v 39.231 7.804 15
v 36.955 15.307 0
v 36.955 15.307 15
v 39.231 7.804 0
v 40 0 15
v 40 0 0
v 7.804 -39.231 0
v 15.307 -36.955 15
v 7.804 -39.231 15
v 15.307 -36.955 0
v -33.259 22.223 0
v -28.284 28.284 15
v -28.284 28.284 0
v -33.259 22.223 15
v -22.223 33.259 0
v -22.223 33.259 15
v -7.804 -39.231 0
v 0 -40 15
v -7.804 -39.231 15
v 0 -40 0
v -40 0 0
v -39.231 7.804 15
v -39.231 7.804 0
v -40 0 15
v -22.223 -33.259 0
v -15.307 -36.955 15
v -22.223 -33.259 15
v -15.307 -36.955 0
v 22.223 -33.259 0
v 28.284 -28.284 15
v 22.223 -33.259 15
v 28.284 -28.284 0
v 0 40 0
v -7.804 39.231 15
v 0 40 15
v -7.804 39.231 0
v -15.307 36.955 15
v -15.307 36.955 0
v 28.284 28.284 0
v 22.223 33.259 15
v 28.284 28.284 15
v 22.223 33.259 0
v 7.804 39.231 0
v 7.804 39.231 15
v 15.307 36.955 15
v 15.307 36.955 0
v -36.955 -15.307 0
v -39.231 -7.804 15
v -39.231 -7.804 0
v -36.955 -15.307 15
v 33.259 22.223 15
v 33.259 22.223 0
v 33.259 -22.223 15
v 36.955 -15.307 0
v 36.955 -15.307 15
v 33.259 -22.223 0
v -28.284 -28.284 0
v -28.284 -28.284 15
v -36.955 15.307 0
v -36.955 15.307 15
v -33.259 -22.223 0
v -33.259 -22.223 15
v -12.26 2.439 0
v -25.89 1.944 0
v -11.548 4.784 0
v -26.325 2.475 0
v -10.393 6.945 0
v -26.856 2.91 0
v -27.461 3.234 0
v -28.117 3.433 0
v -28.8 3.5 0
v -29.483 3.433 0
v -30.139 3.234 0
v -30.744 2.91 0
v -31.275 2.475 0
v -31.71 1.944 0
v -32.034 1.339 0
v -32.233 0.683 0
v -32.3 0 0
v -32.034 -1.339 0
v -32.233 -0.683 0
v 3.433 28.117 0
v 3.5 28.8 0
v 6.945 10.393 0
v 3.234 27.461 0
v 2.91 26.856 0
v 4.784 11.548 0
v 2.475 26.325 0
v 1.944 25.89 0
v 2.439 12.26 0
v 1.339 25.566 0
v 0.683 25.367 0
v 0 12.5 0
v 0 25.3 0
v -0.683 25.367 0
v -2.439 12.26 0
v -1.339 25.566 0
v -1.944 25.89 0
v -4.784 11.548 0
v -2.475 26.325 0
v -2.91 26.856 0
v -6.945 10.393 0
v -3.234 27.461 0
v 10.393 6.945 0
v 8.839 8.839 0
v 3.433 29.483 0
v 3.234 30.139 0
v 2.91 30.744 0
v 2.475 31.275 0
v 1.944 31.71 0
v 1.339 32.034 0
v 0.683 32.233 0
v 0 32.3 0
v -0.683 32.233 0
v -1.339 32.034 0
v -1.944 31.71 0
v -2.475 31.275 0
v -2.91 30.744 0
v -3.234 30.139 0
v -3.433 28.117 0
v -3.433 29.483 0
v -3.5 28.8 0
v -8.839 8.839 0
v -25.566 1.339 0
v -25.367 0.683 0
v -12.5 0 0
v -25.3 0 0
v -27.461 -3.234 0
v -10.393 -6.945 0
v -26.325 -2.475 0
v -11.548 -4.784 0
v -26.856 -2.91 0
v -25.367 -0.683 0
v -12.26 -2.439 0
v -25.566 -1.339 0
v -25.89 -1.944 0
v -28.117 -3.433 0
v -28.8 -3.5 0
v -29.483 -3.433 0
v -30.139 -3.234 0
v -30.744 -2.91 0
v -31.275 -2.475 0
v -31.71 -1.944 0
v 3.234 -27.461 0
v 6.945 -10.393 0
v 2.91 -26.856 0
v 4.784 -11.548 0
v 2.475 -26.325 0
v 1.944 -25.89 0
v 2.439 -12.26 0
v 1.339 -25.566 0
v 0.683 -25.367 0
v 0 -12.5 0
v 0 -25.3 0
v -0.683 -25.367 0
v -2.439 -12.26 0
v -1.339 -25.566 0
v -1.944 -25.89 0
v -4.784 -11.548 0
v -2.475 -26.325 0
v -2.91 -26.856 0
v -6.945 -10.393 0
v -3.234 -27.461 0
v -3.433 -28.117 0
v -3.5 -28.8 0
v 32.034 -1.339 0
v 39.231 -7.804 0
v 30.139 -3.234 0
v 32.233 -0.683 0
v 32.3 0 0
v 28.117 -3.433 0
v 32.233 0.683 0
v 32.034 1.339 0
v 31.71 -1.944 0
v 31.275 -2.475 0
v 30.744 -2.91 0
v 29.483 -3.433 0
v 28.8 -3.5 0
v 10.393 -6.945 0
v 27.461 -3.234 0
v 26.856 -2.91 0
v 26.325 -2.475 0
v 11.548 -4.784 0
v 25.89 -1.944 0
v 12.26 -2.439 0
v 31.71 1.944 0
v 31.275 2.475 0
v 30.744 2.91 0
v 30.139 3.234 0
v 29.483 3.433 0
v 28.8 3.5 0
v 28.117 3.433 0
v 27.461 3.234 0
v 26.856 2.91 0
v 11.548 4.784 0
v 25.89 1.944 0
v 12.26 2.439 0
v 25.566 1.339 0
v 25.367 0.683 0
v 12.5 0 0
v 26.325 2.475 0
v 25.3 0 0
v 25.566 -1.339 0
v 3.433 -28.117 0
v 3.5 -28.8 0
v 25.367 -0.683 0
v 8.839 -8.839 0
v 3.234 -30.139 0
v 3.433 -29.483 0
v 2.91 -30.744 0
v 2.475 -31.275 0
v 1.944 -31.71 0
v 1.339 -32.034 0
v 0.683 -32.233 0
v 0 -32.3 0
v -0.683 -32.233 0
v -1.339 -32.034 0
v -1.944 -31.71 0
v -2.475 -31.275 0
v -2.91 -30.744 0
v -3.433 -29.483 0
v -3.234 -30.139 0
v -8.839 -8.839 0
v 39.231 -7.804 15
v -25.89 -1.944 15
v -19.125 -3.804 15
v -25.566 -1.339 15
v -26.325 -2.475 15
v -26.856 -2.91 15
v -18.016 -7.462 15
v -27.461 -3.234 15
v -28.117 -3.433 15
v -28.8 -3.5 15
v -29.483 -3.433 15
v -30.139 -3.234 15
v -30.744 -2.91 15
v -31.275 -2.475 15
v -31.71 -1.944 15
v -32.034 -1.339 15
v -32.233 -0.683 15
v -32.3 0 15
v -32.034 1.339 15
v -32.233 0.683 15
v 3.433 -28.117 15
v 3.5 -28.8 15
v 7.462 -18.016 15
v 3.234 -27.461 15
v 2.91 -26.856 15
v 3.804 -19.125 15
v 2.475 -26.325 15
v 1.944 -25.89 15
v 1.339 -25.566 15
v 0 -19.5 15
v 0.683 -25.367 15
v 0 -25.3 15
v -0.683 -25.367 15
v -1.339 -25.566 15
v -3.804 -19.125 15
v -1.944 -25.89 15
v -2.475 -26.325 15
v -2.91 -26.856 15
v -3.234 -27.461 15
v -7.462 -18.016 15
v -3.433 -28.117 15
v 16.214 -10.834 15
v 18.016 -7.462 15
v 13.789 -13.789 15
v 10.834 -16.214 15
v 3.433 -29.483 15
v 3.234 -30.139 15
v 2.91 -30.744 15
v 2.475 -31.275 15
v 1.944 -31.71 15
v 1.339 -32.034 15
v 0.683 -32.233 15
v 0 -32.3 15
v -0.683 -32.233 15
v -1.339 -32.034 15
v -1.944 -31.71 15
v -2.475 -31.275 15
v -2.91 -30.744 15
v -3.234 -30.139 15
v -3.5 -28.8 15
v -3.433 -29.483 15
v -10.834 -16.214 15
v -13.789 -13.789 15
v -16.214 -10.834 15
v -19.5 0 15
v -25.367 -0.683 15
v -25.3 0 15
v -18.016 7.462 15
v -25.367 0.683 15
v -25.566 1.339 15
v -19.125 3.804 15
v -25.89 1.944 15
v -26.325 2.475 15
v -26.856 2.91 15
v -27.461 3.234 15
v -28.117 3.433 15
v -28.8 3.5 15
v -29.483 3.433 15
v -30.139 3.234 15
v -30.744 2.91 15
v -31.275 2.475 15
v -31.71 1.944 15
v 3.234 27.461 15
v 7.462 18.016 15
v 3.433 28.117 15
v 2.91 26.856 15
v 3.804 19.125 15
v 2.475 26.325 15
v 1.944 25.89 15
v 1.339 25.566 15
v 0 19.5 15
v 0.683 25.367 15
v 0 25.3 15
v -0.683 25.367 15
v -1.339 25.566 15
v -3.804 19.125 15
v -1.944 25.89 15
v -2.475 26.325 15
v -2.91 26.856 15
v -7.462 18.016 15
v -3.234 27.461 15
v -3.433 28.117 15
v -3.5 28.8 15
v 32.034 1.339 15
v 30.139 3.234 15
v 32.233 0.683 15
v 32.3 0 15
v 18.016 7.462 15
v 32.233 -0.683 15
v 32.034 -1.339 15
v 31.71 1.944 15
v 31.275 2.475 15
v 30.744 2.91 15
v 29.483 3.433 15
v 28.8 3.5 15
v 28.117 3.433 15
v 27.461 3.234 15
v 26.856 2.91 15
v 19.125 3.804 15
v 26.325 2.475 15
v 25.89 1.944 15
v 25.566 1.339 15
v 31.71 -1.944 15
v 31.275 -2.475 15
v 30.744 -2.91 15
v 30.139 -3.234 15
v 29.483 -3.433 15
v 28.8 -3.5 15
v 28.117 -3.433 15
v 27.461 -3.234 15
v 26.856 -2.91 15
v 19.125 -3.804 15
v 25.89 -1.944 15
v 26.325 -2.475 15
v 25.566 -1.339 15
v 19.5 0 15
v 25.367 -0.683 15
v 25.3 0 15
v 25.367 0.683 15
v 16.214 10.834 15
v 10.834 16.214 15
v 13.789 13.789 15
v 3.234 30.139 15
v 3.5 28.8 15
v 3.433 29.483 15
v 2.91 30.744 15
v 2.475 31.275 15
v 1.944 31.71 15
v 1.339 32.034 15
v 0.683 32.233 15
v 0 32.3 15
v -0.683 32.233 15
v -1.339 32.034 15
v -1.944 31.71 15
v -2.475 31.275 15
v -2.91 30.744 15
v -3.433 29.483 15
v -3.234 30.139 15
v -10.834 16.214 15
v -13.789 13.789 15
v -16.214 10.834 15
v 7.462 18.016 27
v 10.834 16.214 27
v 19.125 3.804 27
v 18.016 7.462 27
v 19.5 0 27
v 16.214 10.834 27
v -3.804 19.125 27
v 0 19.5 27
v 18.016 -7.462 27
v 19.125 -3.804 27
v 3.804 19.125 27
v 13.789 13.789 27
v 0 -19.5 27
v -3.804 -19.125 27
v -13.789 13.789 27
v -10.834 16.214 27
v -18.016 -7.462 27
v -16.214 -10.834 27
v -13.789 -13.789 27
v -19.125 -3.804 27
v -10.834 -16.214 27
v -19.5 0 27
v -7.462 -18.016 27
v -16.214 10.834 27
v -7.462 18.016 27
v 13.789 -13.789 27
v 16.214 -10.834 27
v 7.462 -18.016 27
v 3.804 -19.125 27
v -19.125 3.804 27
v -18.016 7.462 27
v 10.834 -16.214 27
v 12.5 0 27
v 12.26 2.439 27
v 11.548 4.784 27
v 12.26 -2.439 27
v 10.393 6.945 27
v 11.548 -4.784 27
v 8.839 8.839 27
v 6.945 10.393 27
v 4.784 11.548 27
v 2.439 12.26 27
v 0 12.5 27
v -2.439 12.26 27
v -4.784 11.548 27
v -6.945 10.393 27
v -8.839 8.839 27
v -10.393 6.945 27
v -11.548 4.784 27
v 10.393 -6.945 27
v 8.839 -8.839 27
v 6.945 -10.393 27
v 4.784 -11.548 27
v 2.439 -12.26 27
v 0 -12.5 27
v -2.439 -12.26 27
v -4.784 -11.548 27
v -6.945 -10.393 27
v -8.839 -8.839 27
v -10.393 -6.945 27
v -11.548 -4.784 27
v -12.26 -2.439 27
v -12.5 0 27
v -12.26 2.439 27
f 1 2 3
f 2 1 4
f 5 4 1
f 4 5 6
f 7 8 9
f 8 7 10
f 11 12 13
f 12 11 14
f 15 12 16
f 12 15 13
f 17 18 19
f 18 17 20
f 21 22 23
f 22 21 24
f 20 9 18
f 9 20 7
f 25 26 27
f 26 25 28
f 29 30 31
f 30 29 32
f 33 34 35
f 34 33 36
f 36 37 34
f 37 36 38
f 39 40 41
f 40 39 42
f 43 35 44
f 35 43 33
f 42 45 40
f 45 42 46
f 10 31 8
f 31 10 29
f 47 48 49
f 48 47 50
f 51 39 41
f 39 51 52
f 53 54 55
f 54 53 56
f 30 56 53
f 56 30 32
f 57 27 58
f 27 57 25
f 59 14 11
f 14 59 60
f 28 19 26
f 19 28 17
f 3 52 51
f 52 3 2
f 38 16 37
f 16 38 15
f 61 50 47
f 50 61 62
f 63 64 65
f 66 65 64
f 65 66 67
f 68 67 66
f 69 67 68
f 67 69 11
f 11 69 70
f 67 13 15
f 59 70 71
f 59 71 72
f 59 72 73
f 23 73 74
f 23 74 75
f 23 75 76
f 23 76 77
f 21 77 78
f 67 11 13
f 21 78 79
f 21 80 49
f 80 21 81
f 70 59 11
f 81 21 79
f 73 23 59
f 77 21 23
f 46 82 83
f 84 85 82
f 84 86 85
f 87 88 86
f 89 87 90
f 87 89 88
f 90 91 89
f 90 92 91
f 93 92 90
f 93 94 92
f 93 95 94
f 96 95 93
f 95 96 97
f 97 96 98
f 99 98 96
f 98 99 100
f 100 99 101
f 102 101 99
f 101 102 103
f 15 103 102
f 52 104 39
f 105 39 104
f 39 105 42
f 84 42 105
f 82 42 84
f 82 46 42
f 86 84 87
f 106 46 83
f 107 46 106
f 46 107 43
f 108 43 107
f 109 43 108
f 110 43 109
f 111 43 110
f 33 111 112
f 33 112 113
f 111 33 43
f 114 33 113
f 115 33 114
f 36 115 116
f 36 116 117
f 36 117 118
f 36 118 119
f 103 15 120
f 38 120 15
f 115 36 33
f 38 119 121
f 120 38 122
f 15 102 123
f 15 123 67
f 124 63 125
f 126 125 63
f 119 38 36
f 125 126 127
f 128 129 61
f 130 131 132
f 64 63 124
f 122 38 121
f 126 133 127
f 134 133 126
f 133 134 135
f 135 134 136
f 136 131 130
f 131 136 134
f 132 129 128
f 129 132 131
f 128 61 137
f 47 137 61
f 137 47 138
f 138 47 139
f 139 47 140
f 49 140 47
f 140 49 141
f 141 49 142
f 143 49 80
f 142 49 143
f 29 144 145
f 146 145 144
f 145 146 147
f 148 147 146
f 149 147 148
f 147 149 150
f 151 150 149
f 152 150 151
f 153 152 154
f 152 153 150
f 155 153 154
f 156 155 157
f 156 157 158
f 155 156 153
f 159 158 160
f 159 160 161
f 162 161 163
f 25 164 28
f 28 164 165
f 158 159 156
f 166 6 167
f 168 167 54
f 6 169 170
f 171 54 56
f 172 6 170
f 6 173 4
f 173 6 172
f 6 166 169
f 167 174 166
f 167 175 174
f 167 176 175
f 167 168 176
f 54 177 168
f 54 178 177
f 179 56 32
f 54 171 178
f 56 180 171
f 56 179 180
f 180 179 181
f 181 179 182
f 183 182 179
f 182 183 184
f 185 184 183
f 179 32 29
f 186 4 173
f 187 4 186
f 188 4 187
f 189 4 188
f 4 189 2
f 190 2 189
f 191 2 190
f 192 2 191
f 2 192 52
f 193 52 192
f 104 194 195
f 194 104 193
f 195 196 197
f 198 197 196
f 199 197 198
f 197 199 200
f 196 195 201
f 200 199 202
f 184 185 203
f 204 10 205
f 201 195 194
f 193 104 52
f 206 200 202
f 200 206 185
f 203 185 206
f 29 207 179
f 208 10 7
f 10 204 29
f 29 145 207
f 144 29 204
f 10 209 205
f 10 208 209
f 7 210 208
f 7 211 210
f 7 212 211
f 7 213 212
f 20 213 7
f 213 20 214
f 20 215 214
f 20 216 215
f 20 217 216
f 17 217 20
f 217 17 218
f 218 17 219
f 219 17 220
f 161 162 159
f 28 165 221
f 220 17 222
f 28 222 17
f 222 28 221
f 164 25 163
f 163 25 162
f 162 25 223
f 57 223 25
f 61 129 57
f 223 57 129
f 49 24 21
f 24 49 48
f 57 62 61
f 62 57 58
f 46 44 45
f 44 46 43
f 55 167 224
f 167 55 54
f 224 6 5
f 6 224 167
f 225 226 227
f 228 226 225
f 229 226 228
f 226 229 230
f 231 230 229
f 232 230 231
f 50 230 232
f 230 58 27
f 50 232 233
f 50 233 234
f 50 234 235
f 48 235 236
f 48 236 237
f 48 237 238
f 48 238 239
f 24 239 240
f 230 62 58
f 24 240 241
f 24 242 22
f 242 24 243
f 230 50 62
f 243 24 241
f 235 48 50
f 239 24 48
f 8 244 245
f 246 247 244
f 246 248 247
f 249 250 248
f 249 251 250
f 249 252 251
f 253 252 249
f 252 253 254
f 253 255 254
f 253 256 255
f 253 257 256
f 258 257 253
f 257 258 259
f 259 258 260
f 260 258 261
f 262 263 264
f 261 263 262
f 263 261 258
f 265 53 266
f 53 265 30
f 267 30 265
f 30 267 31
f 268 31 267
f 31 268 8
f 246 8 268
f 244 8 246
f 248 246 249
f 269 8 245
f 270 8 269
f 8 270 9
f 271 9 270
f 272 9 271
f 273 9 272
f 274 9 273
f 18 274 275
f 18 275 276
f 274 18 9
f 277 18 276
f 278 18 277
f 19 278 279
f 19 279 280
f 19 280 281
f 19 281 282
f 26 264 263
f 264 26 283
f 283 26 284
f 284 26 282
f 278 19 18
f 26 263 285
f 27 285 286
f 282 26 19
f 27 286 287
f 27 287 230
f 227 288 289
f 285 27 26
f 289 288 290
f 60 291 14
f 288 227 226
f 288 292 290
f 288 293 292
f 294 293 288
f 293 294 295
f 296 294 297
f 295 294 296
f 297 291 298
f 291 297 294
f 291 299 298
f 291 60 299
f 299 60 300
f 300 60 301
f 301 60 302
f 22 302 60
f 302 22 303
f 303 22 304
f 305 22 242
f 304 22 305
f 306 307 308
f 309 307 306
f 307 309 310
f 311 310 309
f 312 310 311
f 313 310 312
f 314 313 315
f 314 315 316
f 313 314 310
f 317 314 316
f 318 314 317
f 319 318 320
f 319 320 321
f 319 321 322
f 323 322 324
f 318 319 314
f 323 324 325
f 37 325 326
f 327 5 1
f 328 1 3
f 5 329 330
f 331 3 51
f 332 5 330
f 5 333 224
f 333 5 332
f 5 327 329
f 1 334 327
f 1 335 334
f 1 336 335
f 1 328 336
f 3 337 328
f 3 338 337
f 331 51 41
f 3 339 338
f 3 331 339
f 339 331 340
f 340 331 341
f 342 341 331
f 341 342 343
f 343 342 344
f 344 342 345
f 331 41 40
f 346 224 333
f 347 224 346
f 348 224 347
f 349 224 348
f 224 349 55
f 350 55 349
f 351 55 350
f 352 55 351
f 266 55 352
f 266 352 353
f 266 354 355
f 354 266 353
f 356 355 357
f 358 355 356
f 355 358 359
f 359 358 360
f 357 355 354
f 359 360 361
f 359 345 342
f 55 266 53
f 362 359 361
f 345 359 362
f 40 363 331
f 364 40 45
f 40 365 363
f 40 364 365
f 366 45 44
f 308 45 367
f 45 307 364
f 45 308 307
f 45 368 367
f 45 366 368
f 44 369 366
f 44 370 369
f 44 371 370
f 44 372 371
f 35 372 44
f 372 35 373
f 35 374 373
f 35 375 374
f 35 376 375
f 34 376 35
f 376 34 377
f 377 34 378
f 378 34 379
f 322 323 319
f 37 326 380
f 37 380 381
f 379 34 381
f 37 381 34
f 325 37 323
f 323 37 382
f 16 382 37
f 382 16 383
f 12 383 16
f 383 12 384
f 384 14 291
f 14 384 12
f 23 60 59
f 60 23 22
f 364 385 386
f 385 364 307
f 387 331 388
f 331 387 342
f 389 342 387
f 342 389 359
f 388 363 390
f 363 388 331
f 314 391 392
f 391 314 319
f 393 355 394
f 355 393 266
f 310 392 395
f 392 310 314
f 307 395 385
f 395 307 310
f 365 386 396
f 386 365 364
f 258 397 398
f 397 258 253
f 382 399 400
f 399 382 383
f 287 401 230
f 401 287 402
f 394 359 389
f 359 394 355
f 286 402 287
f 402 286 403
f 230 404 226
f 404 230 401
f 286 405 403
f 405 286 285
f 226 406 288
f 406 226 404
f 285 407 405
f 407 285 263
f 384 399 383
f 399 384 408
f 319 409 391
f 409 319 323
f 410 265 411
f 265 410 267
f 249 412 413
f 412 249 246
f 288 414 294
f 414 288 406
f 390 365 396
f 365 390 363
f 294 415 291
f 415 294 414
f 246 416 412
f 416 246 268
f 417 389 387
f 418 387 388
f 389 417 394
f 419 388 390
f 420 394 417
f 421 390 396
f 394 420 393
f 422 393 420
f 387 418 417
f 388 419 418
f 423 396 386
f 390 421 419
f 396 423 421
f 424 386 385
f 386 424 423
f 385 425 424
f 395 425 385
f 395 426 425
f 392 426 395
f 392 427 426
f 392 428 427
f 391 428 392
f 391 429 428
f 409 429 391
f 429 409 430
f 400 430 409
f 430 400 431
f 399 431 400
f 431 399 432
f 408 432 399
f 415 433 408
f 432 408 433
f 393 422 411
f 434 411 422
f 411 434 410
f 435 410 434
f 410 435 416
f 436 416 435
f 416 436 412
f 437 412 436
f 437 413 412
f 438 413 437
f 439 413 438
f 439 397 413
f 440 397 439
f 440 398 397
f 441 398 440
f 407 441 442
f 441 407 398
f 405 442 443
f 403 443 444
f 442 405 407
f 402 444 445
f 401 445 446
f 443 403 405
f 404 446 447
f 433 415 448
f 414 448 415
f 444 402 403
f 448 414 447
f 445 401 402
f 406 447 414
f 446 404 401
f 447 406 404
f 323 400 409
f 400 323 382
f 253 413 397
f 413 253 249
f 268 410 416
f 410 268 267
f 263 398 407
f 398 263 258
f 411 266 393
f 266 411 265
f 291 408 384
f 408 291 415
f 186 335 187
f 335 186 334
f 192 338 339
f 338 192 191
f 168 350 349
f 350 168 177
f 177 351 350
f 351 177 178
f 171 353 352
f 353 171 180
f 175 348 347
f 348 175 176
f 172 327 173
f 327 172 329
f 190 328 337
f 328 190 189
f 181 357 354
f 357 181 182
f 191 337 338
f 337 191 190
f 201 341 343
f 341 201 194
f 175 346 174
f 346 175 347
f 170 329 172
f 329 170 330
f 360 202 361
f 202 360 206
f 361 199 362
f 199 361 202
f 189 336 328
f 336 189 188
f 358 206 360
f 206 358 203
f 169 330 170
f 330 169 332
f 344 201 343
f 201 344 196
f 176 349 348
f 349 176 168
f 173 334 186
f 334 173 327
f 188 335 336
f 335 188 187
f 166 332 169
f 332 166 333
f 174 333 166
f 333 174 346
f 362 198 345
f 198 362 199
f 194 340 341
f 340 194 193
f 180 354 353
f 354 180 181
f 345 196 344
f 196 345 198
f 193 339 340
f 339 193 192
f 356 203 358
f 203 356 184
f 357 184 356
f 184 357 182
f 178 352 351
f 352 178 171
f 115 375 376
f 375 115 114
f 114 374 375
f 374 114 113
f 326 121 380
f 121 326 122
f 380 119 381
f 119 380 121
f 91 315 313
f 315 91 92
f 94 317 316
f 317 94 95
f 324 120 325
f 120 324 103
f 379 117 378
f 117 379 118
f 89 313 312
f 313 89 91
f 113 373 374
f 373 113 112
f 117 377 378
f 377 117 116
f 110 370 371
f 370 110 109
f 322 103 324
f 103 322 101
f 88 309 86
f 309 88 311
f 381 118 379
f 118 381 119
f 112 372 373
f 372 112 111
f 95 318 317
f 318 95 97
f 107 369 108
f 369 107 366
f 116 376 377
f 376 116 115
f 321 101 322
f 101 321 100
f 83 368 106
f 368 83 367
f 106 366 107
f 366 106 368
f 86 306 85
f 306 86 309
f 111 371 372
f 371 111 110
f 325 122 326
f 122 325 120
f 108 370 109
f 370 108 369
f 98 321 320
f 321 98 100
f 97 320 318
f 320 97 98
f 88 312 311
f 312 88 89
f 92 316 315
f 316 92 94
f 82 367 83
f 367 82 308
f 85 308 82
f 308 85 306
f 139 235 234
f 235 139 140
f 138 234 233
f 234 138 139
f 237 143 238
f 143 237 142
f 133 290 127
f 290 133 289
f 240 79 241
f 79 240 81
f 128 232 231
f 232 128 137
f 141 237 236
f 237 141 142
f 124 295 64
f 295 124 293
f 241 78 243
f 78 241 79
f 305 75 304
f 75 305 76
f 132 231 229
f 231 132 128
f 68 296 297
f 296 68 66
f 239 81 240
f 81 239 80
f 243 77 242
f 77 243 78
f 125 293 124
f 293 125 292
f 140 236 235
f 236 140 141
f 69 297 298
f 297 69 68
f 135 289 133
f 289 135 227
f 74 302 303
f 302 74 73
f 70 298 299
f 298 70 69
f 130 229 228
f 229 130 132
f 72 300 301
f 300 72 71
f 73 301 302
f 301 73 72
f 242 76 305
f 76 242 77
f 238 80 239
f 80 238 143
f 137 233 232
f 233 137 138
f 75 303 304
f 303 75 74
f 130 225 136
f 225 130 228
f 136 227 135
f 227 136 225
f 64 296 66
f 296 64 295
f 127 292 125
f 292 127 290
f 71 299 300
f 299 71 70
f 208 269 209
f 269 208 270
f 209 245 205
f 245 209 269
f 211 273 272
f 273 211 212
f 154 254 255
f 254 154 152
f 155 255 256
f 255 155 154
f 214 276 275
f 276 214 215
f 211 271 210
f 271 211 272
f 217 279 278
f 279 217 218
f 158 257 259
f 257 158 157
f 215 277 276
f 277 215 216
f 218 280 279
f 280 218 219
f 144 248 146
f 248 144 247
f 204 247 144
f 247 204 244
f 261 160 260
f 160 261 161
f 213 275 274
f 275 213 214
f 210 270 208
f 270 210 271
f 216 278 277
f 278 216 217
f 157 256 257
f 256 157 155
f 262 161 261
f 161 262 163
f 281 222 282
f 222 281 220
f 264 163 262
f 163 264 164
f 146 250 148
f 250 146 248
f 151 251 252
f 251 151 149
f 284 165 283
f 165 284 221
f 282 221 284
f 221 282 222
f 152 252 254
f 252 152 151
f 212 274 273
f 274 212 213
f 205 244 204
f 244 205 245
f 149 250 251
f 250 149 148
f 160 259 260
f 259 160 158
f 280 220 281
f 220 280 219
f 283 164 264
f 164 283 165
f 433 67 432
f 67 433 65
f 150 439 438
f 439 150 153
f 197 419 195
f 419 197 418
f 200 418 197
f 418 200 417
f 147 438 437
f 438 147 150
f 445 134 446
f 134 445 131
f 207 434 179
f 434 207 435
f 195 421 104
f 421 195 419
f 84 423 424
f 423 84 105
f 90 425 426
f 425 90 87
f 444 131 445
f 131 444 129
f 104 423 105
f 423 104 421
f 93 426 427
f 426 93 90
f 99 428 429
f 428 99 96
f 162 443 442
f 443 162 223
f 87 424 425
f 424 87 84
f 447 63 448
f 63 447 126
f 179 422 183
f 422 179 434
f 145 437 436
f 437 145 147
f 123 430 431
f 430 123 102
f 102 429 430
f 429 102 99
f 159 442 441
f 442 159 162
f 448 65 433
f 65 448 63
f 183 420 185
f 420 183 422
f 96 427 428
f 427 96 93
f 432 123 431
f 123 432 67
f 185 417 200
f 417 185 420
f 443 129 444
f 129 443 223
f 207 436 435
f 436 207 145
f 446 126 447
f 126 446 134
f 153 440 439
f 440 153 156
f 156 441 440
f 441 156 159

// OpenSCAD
$fn = 32;

// ----------------------------------------------------------------------
// Bolt-circle flange: 80 mm outside, 4 bolt holes, bore 25 mm
// ----------------------------------------------------------------------

// --- parameters (mm) ---
flange_d = 80;            // flange outside diameter
flange_t = 15;            // flange thickness
bolts = 4;                // number of bolt holes
bolt_d = 7;               // bolt clearance
bolt_r = 28.8;            // bolt circle radius
bore_d = 25;              // centre bore
hub_d = 39;               // raised hub diameter
hub_h = 12;               // raised hub height

module body() {
  cylinder(h = flange_t, d = flange_d);
  /* raised hub, sunk 1 mm into the flange */
  translate([0, 0, flange_t - 1]) cylinder(h = hub_h + 1, d = hub_d);
}

difference() {
  body();
  /* bolt circle */
  for (i = [0 : bolts - 1]) rotate([0, 0, i * 360 / bolts]) translate([bolt_r, 0, -1]) cylinder(h = flange_t + hub_h + 3, d = bolt_d);
  translate([0, 0, -1]) cylinder(h = flange_t + hub_h + 3, d = bore_d);
}
